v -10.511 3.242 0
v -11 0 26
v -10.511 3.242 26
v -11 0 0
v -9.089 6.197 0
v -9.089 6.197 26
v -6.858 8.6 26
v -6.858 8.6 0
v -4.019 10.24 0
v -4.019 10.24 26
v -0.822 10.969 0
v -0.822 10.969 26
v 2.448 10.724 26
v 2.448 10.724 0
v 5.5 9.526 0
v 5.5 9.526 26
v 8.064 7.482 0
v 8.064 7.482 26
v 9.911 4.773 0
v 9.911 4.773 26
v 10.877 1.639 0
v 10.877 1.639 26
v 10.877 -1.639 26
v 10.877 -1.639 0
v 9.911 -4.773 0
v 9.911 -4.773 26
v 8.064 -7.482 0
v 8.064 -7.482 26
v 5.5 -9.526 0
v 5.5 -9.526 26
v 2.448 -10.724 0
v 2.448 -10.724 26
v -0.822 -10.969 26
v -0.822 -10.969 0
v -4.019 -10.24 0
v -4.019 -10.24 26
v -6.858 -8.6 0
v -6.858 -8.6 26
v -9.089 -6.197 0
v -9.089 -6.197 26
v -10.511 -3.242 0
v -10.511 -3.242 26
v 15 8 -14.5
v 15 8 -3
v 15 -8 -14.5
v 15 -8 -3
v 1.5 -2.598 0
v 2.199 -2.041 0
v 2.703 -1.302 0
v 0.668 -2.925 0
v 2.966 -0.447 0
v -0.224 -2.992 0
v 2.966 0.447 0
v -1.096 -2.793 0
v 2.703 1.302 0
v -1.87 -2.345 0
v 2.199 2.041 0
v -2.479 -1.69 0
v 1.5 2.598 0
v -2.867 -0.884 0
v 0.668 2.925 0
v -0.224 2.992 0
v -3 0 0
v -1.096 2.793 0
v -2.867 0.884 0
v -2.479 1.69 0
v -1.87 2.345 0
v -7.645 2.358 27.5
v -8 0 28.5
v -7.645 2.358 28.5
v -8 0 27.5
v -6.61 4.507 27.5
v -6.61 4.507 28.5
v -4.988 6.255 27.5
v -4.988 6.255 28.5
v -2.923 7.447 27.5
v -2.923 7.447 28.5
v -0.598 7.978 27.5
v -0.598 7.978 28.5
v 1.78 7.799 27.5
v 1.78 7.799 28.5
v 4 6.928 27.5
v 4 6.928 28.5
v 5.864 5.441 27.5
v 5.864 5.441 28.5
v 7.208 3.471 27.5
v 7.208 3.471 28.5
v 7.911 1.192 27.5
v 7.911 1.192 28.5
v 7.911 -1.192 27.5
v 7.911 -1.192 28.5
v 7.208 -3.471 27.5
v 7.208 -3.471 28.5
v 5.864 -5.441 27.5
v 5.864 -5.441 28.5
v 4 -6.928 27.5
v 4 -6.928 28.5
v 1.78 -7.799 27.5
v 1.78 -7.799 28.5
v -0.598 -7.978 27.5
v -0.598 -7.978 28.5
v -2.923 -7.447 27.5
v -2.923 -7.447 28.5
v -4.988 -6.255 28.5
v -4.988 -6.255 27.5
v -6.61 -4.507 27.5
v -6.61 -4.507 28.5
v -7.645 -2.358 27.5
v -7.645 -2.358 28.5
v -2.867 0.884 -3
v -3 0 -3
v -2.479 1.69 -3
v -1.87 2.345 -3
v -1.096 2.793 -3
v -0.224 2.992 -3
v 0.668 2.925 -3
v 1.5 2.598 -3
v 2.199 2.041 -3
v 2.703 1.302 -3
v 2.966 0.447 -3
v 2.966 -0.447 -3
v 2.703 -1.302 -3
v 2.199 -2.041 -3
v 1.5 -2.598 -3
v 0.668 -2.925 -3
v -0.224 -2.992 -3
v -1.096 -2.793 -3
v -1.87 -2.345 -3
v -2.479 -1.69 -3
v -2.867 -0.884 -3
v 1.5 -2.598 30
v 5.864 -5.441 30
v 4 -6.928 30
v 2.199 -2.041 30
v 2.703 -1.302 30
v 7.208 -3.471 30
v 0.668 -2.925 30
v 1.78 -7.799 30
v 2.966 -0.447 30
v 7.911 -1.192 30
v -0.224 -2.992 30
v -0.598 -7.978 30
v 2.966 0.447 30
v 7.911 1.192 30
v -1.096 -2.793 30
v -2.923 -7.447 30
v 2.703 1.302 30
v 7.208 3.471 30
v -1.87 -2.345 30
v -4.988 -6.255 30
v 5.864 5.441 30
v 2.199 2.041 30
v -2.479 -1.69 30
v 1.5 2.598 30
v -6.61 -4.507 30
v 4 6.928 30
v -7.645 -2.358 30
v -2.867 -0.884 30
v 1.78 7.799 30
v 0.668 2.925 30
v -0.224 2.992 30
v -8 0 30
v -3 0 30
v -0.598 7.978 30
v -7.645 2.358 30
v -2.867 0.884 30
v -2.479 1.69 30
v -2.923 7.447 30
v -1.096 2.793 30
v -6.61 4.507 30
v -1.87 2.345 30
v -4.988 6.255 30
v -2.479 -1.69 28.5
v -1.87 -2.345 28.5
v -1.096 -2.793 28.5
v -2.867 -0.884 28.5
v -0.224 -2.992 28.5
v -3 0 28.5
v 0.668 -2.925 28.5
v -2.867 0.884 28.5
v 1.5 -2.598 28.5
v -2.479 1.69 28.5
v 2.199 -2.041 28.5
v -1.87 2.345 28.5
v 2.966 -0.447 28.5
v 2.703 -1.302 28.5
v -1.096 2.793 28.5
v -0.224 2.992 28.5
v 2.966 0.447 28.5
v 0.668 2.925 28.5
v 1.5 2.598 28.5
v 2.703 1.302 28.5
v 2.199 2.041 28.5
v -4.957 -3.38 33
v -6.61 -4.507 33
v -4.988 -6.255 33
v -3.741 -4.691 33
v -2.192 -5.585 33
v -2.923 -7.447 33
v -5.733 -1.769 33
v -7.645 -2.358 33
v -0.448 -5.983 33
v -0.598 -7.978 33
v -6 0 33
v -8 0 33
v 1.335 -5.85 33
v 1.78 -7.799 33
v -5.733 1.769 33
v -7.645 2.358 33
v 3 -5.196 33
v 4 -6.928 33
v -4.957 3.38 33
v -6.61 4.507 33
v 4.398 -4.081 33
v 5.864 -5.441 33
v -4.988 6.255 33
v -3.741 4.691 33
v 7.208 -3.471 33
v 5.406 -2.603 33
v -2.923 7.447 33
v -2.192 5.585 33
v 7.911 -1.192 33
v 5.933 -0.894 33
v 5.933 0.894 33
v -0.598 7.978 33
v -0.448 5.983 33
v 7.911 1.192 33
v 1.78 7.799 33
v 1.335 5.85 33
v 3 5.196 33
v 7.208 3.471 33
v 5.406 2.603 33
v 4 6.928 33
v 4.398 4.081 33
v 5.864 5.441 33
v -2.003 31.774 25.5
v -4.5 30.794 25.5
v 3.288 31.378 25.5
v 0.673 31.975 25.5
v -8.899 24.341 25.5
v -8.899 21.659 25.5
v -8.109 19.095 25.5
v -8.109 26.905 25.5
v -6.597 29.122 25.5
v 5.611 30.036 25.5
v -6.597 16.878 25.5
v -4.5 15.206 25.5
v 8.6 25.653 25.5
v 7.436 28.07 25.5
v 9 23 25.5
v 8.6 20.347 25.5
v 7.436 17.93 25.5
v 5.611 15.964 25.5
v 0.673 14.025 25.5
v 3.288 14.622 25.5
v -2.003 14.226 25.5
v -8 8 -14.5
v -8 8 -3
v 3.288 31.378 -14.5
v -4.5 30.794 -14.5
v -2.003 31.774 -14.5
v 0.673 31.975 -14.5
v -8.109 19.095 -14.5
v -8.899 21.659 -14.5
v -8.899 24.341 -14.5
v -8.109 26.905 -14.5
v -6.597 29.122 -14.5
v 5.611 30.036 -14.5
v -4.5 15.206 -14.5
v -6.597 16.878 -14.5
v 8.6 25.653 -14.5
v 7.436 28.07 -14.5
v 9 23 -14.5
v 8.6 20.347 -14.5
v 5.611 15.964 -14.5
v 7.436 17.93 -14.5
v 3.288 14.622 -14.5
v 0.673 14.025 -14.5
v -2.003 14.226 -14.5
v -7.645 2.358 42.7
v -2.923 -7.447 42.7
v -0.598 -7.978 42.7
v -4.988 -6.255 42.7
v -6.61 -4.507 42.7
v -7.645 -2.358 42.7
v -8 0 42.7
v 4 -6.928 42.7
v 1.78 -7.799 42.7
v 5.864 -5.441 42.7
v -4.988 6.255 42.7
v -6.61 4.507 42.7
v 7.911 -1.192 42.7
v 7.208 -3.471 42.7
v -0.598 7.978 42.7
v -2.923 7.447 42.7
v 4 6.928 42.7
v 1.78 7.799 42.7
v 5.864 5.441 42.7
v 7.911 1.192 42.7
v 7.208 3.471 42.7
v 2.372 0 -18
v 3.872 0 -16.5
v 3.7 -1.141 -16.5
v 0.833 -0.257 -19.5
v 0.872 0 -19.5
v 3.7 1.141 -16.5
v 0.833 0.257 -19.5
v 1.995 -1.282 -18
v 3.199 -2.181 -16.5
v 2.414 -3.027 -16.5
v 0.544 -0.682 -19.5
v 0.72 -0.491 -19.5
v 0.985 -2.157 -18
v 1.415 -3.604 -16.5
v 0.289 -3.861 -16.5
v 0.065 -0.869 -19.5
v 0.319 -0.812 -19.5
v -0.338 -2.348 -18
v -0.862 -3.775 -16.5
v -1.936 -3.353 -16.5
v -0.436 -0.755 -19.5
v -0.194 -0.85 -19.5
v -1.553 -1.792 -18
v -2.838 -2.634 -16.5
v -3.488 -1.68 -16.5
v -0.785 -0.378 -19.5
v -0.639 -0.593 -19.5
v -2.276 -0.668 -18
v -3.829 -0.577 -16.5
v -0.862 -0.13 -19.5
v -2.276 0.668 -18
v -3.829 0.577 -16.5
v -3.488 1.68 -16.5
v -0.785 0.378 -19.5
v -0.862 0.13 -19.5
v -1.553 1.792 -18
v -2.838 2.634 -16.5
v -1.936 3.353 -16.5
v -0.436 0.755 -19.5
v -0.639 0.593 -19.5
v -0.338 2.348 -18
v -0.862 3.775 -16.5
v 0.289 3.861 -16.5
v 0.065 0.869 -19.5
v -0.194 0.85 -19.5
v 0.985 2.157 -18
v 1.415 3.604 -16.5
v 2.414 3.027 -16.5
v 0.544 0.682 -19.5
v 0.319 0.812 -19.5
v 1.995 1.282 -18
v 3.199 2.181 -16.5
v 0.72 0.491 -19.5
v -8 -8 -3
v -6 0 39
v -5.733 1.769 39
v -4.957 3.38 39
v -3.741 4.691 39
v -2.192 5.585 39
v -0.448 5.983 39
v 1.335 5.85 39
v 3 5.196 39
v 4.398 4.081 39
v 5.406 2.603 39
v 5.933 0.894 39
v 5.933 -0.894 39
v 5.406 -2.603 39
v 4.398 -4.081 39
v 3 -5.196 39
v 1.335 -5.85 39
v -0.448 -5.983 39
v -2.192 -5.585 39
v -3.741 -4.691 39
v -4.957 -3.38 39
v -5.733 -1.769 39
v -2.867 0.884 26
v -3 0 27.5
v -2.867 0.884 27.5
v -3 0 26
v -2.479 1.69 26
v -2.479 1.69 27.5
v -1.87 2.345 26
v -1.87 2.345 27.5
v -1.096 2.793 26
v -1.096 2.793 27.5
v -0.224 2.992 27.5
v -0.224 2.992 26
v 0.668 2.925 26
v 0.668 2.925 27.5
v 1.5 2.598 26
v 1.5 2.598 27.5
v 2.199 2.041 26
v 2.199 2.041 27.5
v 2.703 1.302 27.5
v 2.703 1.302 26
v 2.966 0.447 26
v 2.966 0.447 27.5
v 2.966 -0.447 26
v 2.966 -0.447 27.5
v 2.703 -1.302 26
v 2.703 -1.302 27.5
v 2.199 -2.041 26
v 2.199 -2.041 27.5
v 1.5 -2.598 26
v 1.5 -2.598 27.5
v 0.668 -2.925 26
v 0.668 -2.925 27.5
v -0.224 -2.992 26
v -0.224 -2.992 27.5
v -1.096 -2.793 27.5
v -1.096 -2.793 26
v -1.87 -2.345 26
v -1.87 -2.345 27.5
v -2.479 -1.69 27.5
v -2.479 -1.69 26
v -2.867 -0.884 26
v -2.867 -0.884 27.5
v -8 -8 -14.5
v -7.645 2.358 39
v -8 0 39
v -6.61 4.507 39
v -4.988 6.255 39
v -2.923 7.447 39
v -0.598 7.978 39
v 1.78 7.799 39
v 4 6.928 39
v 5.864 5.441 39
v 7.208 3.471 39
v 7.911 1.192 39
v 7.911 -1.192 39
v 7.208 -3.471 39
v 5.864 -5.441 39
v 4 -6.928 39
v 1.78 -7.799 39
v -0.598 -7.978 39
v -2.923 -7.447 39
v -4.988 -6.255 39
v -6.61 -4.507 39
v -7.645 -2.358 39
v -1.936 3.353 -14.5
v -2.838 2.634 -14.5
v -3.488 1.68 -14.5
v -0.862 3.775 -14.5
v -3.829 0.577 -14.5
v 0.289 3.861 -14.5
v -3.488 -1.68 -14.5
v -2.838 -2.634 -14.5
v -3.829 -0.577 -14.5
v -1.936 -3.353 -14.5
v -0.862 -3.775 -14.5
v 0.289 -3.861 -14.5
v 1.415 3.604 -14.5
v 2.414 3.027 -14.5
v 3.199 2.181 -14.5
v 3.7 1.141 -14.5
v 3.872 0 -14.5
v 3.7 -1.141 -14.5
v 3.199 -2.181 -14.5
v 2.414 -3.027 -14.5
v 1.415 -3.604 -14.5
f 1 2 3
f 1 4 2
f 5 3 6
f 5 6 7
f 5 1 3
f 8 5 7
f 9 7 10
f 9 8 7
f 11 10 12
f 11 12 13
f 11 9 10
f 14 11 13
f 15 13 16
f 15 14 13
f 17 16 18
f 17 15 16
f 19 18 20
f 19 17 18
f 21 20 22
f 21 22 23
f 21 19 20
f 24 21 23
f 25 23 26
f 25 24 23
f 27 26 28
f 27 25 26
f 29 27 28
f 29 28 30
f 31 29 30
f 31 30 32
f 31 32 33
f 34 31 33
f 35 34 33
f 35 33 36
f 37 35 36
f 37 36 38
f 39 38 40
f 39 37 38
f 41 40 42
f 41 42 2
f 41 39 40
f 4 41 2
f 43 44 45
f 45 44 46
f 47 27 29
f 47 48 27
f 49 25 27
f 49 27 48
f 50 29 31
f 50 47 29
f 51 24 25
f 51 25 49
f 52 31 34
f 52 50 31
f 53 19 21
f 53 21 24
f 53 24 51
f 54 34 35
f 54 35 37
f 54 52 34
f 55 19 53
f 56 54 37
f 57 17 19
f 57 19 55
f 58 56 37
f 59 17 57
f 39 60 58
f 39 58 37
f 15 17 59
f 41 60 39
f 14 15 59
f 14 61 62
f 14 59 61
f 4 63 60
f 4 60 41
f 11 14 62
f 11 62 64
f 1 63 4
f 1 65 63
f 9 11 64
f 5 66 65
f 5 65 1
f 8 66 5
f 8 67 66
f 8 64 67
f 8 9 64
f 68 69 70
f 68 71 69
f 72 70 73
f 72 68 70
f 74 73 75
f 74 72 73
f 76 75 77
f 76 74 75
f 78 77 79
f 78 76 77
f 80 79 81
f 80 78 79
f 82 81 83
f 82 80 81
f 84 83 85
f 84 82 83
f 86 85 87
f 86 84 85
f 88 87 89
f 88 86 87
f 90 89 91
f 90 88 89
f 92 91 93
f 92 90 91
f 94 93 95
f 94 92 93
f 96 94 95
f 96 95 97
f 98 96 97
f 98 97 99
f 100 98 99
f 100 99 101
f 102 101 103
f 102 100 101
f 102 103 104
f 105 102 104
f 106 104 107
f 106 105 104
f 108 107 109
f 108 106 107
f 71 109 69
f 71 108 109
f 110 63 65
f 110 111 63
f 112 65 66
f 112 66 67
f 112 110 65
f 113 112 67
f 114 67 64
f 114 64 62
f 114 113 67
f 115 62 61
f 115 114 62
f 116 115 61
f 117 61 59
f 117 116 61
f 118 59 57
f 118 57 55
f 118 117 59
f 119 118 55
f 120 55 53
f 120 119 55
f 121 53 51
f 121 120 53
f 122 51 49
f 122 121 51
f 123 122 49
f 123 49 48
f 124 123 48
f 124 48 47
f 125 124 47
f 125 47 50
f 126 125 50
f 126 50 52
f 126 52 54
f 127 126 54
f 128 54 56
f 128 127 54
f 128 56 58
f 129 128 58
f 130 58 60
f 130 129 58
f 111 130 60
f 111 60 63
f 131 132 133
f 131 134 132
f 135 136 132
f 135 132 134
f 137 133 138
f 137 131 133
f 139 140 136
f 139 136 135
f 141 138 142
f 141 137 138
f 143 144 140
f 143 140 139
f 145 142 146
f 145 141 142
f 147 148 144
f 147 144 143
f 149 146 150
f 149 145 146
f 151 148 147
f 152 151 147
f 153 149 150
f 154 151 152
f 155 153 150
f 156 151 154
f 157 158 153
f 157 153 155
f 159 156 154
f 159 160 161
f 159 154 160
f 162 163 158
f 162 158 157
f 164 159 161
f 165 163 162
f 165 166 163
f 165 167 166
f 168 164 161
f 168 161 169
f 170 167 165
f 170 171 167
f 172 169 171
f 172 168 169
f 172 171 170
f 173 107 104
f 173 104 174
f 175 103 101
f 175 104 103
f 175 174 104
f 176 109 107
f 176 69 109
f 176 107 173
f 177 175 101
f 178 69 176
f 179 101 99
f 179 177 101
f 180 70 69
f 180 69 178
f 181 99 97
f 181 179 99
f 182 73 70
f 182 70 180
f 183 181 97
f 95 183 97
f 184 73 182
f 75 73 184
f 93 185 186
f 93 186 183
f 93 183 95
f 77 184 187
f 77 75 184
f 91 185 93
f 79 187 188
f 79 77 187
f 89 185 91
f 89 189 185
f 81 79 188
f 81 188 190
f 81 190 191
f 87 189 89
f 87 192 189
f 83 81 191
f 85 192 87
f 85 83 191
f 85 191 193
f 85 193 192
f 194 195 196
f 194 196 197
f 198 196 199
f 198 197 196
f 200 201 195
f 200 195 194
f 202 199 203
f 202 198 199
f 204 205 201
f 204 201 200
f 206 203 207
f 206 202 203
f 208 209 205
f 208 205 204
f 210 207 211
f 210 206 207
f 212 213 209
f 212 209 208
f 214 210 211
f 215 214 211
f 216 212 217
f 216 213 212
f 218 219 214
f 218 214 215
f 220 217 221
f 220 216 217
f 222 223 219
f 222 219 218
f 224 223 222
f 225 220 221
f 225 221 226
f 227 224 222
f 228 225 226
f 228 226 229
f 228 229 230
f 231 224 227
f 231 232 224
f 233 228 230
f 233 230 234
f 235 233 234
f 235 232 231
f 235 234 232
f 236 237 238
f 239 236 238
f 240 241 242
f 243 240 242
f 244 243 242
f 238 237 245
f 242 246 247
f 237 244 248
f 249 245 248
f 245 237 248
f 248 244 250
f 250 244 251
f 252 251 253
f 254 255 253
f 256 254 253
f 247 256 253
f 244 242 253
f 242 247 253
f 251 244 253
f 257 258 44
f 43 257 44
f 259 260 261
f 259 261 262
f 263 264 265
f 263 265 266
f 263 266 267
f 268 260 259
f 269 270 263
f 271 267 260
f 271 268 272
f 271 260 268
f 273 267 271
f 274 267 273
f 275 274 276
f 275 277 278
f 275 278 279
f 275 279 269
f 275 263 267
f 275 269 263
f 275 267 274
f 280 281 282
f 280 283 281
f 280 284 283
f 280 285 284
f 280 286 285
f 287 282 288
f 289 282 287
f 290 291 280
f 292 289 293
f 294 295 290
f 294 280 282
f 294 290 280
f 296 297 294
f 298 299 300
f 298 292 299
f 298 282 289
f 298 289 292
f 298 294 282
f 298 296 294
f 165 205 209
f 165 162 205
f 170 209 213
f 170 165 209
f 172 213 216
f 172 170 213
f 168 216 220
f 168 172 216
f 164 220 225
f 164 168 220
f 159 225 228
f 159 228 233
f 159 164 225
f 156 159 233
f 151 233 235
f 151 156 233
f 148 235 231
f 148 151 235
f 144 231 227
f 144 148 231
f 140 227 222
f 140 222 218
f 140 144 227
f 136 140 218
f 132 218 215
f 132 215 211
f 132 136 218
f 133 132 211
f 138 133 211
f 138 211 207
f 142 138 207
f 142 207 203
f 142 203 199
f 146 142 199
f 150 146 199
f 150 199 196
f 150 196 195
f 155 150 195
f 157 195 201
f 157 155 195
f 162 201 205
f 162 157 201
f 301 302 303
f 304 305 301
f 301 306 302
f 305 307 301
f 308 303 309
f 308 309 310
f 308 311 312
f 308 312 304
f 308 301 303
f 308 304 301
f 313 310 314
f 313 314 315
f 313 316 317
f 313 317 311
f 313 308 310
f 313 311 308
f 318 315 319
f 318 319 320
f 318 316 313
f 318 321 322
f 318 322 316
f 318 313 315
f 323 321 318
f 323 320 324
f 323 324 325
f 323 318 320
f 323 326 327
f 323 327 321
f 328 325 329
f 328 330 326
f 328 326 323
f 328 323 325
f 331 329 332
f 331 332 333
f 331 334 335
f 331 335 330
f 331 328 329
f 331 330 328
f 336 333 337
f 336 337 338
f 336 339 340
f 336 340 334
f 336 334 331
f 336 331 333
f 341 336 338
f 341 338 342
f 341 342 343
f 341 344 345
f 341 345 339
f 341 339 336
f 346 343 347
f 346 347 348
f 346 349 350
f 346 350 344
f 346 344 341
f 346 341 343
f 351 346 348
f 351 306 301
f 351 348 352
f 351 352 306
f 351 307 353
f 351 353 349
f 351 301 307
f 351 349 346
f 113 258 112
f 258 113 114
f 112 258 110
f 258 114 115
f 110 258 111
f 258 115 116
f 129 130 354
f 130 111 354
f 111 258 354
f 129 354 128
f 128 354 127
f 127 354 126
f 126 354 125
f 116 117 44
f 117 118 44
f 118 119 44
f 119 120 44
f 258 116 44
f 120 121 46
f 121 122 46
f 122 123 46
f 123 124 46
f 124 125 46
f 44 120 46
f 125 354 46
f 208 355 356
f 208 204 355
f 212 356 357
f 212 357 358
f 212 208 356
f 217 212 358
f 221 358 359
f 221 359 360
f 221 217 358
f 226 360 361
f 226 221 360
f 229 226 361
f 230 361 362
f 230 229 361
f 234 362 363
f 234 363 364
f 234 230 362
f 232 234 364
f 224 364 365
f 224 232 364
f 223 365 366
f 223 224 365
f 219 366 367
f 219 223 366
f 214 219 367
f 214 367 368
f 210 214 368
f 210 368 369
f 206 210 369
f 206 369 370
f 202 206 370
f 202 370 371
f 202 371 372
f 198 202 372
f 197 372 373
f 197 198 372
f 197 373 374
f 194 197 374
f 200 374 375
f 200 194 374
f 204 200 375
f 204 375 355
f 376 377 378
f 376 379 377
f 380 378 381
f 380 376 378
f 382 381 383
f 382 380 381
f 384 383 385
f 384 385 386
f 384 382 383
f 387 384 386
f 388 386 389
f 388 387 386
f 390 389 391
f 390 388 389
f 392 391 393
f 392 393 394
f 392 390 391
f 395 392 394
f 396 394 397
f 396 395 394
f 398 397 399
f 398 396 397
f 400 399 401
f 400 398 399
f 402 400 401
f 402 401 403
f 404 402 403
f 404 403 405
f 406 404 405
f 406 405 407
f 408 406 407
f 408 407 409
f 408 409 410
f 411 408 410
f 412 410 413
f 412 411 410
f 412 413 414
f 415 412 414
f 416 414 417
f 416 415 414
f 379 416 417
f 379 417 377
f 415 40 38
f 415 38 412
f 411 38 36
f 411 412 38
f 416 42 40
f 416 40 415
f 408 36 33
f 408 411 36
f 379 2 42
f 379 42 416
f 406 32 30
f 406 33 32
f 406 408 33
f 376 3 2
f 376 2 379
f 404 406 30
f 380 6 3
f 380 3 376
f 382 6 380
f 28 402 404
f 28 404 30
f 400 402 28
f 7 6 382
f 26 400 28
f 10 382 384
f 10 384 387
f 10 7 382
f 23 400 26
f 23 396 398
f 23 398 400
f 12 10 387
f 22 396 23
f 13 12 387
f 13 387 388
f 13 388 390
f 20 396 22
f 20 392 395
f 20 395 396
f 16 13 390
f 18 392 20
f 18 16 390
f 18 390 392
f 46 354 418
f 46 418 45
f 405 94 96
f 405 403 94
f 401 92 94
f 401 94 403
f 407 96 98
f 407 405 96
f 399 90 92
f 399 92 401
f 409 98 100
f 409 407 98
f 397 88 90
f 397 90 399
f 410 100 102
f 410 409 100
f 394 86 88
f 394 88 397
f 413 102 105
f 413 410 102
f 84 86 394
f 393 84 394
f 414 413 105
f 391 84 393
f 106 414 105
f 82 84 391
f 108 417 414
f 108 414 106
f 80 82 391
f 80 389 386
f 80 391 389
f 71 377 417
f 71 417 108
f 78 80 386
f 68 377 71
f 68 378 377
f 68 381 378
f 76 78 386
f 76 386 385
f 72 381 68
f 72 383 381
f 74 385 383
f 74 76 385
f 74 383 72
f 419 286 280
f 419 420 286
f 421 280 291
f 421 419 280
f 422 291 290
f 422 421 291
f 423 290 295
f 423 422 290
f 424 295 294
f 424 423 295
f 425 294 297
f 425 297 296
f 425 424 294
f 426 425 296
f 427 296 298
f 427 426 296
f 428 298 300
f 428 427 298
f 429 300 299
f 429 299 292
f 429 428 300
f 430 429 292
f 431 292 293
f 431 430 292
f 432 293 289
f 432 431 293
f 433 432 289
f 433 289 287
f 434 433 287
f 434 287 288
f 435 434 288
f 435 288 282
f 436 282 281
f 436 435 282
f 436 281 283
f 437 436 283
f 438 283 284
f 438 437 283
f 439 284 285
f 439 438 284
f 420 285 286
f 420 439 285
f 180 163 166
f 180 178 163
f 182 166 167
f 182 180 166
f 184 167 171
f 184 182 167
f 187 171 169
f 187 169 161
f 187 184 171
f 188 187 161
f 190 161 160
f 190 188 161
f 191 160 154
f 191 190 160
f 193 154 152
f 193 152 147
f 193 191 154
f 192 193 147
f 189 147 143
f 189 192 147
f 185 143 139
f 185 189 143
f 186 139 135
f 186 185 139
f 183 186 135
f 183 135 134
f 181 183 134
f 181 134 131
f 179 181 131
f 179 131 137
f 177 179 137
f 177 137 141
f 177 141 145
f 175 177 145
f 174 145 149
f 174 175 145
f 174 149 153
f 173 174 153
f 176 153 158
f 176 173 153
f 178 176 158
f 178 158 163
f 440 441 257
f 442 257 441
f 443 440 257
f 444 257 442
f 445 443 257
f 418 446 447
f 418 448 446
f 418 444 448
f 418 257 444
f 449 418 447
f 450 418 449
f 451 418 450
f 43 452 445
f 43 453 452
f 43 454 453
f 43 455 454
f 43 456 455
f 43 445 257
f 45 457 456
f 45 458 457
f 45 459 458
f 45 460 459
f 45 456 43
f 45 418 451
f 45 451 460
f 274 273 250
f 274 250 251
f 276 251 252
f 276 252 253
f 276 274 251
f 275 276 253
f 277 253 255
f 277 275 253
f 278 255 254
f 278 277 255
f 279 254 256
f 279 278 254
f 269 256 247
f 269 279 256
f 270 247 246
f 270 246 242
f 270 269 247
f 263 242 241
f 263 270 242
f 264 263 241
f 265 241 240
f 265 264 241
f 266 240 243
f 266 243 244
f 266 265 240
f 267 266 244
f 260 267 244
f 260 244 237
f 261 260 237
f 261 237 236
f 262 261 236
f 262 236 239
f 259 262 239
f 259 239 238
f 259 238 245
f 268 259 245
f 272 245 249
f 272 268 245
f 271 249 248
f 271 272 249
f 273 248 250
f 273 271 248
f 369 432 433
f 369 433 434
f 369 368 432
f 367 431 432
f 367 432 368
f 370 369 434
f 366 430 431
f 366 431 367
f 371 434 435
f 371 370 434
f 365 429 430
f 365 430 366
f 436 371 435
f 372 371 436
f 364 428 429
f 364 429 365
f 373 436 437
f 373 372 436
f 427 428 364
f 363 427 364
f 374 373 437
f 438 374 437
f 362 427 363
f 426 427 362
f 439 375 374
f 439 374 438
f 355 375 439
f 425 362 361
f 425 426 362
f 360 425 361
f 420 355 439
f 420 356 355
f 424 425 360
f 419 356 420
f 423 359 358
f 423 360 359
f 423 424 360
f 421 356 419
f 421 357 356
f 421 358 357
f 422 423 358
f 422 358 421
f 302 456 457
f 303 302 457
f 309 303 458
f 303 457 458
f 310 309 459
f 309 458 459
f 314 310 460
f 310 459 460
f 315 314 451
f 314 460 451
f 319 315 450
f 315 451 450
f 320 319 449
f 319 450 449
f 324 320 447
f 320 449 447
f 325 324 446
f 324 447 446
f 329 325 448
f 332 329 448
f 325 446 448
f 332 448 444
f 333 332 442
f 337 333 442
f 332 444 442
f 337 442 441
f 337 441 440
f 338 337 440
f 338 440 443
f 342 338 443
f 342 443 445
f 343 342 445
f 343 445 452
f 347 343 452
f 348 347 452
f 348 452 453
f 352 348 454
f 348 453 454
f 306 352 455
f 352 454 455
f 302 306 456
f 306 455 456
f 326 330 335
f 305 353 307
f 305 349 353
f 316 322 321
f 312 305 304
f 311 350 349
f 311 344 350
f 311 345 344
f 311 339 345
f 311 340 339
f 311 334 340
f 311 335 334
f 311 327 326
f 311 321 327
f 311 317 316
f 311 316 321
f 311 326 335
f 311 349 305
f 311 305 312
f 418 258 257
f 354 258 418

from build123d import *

# Parameters (mm, degrees)
F2_W      = 23
F2_H      = 16
F3_DEPTH  = 11.5
F4_R      = 3.8718113402
F5_DEPTH  = 2
F5_FACE_R = 3.8718113402
F6_DEPTH  = 3
F6_TAPER  = 45
F7_R      = 9
F8_DEPTH  = 40


with BuildPart() as f1:
    # F0 (on Front) → F1 (revolve)
    with BuildSketch(Plane.XZ):
        Polygon((0, 0), (0, 42.7), (-8, 42.7), (-8, 39), (-6, 39), (-6, 33), (-8, 33), (-8, 30), (-3, 30), (-3, 28.5), (-8, 28.5), (-8, 27.5), (-3, 27.5), (-3, 26), (-11, 26), (-11, 0), (-3, 0), (-3, -3), (0, -3), align=None)
    revolve(axis=Axis((0, 0, 21.35), (0, 0, -1)))

    # F2 (on face) → F3 (join)
    with BuildSketch(Plane(origin=(0, 0, -3), x_dir=(1, 0, 0), z_dir=(0, 0, -1))):
        with Locations((3.5, 0)):
            Rectangle(F2_W, F2_H)
    extrude(amount=F3_DEPTH)

    # F4 (on face) → F5 (join)
    with BuildSketch(Plane(origin=(0, 0, -14.5), x_dir=(1, 0, 0), z_dir=(0, 0, -1))):
        Circle(F4_R)
    extrude(amount=F5_DEPTH)

    # F5_face (on face) → F6 (join)
    with BuildSketch(Plane(origin=(0, 0, -16.5), x_dir=(1, 0, 0), z_dir=(0, 0, -1))):
        Circle(F5_FACE_R)
    extrude(amount=F6_DEPTH, taper=F6_TAPER)


with BuildPart() as f8:
    # F7 (on face) → F8 (new body)
    with BuildSketch(Plane(origin=(0, 0, -14.5), x_dir=(1, 0, 0), z_dir=(0, 0, -1))):
        with Locations((0, -23)):
            Circle(F7_R)
    extrude(amount=-F8_DEPTH)


solid = Compound([f1.part, f8.part])
